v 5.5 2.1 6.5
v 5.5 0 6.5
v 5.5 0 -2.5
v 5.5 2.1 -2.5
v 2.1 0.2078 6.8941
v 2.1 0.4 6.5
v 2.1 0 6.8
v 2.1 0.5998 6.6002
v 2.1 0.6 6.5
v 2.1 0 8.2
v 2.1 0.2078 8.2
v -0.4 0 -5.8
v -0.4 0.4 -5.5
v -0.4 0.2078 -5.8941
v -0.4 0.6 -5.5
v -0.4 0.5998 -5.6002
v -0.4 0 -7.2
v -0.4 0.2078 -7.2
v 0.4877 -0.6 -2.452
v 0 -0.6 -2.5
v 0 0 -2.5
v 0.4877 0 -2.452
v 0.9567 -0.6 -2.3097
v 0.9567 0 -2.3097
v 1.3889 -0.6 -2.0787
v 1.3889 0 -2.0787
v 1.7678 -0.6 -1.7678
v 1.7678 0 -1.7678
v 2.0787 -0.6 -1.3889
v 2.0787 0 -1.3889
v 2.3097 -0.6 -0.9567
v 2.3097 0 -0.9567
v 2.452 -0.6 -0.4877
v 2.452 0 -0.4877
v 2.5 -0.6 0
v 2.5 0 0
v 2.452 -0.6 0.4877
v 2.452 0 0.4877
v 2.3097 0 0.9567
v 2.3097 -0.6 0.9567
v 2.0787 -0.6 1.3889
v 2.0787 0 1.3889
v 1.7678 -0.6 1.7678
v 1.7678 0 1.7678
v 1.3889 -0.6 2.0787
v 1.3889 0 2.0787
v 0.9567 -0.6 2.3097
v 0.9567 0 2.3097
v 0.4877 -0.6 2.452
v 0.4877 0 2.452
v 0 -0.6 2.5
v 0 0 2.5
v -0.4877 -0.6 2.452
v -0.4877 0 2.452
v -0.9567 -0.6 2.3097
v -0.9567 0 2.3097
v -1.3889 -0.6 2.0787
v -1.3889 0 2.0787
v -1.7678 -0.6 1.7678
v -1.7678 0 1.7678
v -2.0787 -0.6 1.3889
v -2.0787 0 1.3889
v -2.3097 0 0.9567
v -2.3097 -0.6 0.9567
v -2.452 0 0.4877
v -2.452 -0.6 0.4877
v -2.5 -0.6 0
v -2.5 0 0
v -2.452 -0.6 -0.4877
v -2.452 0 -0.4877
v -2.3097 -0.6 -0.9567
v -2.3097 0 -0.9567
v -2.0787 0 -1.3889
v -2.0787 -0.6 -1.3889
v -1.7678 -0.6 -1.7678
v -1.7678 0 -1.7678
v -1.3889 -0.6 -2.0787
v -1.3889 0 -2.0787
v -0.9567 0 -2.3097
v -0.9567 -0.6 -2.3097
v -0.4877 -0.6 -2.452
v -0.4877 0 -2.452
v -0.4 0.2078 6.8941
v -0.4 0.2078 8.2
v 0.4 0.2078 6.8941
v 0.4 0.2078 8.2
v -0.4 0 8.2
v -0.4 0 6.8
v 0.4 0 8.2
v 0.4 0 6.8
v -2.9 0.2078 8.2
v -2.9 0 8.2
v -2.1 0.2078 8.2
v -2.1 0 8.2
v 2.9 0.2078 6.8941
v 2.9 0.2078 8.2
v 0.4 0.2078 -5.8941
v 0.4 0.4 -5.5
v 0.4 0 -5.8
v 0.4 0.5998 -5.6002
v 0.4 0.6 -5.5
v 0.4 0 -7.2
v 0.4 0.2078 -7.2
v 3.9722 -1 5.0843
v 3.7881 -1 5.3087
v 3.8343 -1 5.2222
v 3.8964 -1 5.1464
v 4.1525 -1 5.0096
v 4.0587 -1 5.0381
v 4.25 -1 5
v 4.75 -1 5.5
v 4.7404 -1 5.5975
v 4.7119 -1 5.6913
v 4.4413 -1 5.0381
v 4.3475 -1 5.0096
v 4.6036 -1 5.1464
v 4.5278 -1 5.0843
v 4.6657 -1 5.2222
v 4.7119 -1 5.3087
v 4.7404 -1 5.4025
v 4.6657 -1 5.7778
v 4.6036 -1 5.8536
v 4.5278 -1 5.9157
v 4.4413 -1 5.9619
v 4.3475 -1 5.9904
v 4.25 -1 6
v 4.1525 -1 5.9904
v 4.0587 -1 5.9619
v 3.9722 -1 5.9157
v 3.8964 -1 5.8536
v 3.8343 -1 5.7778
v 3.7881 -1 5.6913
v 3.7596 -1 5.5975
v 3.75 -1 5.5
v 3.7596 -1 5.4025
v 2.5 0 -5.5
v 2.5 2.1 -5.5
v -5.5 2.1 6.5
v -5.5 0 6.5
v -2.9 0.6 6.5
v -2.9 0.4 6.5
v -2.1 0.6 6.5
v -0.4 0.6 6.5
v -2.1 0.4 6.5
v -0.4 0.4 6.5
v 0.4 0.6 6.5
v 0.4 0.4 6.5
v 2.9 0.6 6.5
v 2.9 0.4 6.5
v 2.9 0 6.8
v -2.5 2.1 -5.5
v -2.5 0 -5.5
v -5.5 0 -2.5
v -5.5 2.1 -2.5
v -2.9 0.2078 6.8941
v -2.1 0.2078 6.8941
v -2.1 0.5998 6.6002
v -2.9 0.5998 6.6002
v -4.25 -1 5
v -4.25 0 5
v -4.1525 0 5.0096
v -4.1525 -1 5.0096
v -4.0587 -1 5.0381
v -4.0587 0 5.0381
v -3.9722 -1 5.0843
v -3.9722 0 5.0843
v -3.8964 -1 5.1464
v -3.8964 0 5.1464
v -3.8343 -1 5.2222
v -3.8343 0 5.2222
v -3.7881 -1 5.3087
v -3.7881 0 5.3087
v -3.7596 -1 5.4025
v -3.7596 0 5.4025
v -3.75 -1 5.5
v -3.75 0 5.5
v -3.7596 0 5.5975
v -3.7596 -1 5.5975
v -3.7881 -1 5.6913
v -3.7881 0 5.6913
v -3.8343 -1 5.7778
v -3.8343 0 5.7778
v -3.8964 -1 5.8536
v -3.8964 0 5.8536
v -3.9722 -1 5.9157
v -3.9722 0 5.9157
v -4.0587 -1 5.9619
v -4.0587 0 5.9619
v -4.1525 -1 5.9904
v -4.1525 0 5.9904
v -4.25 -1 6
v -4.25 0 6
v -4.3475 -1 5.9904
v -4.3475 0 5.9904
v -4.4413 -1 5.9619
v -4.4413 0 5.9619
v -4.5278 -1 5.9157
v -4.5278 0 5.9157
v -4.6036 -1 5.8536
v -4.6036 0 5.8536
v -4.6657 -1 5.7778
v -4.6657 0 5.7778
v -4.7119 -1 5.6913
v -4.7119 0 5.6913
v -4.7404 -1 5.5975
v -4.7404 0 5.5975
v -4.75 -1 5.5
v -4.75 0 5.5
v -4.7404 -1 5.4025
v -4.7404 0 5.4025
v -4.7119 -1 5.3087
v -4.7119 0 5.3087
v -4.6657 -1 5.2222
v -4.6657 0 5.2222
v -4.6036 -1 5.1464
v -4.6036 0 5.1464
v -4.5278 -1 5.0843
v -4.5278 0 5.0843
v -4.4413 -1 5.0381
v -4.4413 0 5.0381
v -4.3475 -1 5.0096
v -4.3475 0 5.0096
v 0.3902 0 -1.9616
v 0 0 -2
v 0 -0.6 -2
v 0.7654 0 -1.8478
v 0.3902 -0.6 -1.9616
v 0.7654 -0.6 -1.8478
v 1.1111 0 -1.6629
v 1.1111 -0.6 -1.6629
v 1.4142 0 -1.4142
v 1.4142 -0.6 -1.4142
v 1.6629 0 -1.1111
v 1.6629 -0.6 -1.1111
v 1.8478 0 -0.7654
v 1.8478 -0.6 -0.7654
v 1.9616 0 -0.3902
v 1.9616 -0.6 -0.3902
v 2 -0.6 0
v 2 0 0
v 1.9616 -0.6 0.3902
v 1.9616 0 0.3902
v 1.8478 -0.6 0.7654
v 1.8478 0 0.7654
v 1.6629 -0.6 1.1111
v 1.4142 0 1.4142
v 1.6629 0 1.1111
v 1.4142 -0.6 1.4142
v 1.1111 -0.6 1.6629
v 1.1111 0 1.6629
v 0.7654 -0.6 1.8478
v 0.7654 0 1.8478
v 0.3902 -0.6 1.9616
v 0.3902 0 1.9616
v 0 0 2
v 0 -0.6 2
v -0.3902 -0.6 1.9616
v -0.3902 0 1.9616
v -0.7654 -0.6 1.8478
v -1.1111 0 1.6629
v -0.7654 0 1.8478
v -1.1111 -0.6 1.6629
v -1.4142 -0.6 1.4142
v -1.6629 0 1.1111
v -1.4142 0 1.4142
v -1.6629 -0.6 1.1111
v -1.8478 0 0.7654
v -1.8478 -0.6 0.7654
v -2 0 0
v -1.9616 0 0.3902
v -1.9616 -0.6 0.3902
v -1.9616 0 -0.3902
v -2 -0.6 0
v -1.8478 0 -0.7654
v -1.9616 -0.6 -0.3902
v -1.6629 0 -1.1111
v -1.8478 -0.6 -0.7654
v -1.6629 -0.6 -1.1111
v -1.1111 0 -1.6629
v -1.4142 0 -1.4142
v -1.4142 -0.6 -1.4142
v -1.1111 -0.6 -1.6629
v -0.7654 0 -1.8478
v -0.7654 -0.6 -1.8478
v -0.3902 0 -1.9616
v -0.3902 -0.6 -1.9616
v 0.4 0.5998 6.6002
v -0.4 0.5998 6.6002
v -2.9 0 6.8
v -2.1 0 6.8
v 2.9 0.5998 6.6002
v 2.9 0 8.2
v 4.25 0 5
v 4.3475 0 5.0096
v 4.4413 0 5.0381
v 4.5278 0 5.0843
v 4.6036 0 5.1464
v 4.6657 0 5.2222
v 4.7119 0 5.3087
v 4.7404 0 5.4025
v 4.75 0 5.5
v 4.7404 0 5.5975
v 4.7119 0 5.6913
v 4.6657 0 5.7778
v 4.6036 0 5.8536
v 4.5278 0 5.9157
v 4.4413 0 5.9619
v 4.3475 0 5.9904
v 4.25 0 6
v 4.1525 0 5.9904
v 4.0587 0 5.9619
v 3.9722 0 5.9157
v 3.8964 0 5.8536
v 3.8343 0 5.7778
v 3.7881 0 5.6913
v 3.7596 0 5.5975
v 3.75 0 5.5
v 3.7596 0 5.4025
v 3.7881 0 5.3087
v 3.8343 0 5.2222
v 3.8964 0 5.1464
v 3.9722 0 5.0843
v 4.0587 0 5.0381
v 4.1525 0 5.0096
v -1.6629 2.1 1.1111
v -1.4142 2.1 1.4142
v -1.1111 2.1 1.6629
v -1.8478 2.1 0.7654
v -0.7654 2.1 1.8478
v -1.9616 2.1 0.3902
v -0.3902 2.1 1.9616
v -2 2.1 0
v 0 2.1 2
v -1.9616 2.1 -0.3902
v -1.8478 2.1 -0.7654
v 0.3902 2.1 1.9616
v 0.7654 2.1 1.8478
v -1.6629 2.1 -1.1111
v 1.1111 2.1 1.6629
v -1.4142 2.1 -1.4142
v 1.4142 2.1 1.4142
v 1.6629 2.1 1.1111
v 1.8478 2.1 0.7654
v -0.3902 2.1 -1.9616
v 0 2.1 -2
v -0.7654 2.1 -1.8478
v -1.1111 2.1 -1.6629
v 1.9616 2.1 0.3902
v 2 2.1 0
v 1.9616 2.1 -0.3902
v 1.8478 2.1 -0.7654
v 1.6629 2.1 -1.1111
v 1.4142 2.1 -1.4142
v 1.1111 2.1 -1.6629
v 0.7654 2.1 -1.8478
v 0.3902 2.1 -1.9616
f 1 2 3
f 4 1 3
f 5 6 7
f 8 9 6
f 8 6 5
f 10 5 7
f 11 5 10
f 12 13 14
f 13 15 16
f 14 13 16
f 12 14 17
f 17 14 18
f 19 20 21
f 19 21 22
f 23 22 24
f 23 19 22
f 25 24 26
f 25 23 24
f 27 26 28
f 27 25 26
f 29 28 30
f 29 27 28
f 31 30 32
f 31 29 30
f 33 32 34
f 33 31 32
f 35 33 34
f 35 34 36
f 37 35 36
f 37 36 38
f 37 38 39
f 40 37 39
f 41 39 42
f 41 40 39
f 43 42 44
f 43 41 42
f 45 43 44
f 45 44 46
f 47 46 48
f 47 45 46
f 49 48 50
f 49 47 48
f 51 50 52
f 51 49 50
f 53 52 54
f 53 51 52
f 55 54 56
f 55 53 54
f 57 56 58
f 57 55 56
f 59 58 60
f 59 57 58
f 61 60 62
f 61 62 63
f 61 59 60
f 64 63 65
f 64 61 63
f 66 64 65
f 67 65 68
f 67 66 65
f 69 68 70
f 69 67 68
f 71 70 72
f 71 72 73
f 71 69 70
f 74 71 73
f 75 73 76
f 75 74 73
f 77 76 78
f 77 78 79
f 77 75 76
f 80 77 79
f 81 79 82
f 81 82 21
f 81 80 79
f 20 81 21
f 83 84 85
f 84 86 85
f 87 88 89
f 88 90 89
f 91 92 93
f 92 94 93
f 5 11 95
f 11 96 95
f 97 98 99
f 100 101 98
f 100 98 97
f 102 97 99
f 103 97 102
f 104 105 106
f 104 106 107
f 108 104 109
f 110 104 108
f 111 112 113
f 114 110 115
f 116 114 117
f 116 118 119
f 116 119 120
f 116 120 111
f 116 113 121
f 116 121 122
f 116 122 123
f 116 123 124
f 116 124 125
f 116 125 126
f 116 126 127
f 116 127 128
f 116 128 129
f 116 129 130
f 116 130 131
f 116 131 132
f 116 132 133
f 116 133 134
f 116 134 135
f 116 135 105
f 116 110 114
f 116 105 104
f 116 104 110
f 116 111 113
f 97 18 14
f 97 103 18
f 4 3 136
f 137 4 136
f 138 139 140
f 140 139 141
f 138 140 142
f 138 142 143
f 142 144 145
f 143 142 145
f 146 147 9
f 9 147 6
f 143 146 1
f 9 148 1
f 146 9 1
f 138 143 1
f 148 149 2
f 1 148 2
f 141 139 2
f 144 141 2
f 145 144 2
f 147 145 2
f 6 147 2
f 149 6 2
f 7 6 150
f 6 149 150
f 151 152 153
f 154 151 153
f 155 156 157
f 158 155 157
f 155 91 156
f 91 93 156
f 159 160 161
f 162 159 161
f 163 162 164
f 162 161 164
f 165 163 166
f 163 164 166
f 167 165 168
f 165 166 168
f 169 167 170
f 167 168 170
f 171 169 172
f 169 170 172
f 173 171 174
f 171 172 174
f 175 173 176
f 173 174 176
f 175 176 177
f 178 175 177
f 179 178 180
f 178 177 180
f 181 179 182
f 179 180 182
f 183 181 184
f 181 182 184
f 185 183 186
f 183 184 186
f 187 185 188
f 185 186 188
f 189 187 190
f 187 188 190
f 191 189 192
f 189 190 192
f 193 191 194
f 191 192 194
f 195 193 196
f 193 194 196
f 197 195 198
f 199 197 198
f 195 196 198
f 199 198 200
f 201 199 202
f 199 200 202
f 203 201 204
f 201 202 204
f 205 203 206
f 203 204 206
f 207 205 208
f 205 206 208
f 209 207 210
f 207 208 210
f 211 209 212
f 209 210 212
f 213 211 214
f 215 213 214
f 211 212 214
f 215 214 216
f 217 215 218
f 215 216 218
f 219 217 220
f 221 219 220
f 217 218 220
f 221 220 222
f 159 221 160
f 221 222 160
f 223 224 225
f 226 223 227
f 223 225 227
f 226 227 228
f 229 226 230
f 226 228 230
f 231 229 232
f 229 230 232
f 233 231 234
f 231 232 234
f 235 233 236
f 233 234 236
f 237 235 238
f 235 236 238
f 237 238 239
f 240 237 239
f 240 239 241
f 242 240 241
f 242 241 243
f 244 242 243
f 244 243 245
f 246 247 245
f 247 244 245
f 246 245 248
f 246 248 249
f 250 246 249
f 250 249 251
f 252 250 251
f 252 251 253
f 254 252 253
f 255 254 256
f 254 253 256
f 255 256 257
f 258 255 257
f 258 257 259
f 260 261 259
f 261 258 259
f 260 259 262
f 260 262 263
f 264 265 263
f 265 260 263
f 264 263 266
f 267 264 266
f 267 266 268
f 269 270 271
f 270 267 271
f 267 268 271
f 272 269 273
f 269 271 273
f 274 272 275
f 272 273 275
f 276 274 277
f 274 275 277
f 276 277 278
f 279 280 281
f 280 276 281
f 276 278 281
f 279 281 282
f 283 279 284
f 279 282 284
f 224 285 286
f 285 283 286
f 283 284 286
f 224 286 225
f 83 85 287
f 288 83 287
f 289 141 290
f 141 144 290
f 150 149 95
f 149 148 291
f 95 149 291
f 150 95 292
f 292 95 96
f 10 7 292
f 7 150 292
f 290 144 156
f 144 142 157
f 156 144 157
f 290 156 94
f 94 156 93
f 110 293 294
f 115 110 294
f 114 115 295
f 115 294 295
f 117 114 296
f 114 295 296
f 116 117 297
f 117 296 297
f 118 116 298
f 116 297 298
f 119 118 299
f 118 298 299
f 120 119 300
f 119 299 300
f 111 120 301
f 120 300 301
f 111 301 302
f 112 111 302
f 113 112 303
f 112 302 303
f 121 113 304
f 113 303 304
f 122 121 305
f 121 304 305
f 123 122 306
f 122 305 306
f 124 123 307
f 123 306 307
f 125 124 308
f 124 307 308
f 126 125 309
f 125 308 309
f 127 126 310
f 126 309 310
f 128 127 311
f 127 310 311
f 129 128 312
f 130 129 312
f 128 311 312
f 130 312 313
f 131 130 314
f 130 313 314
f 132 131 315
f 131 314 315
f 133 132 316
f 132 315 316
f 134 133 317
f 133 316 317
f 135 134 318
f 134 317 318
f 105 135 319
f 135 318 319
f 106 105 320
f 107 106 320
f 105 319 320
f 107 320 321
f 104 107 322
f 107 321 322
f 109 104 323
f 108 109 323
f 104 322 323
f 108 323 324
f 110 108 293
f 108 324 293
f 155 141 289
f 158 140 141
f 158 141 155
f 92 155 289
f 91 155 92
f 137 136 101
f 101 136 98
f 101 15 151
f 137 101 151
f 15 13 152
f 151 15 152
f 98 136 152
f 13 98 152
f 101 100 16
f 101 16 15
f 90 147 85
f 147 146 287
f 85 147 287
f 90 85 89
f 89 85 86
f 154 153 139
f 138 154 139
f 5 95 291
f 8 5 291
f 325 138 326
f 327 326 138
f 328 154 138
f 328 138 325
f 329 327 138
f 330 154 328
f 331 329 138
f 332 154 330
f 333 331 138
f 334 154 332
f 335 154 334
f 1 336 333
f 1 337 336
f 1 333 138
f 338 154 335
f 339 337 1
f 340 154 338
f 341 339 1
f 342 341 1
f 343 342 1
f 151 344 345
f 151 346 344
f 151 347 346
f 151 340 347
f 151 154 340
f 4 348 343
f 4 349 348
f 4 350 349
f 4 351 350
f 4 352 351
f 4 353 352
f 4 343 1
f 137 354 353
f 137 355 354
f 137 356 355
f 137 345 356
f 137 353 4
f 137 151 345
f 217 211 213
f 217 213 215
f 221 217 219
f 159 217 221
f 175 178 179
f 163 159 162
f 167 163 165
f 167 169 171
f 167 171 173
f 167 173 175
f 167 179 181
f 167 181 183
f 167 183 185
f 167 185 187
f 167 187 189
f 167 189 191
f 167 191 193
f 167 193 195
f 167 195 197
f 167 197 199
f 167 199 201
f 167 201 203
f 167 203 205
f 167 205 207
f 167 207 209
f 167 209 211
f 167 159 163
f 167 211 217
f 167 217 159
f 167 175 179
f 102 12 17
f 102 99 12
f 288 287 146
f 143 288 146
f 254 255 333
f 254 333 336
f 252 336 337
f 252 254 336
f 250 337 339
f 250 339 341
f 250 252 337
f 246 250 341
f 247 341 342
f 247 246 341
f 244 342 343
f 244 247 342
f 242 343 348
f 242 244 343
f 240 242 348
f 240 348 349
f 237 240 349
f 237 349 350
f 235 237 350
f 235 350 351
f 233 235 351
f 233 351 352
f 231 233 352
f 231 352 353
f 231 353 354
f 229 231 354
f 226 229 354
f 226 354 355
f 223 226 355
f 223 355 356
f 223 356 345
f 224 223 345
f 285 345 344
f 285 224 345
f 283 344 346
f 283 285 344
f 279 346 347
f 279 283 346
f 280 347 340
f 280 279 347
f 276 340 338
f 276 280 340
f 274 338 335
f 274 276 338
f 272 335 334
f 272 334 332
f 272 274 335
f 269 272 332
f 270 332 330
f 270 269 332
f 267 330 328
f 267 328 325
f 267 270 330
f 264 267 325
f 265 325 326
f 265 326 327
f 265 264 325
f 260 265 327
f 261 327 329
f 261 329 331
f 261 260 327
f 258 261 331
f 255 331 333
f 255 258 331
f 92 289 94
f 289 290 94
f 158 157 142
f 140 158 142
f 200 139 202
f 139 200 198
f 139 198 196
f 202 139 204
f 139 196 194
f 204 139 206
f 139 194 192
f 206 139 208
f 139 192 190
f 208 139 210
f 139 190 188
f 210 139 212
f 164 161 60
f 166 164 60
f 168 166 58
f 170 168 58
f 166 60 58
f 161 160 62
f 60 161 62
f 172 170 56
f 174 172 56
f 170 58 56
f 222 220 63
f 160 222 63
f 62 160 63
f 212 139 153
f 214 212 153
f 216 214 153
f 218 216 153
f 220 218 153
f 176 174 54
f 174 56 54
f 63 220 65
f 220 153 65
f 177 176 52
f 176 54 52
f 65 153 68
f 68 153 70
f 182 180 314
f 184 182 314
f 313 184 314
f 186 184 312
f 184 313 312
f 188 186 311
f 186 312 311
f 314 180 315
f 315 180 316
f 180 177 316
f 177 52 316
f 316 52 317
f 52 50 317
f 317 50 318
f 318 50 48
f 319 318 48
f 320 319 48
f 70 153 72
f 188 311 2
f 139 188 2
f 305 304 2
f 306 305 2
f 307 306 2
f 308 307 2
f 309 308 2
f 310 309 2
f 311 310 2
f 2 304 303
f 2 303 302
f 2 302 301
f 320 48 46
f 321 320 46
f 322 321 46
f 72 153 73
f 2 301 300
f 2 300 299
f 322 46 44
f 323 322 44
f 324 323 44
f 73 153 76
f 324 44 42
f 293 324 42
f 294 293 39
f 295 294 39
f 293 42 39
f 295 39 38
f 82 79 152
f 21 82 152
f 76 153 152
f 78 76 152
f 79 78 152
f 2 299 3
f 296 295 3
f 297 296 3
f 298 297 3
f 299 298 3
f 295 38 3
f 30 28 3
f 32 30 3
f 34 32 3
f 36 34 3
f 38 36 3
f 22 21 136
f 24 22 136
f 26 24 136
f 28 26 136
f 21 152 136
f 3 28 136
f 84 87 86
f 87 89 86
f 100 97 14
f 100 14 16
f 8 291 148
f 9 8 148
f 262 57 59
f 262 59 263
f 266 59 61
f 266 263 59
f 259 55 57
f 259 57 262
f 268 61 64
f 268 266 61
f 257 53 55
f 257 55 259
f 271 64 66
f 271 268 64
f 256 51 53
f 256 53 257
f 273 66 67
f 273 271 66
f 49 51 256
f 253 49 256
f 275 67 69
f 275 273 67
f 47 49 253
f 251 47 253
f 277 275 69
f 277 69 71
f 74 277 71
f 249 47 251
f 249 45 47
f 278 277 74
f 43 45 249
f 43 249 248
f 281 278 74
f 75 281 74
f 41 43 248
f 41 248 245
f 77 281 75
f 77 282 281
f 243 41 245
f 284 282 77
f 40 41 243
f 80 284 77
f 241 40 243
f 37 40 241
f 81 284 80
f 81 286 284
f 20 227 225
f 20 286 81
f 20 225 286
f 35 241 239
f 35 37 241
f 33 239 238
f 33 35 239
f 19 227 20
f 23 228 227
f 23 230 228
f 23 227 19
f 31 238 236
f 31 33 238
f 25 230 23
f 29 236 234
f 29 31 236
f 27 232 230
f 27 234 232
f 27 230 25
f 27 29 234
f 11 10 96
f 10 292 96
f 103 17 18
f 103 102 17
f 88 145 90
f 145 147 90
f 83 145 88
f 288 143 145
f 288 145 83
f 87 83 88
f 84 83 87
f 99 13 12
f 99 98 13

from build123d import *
from build123d.topology import SkipClean

# Parameters (mm, degrees)
SKETCH1_R           = 2
BOSS_EXTRUDE1_DEPTH = 2.1
BOSS_EXTRUDE2_START = 0.6
SKETCH2_R           = 2.5
SKETCH2_R_2         = 2
BOSS_EXTRUDE2_DEPTH = 0.6
SKETCH3_R           = 0.5
BOSS_EXTRUDE3_DEPTH = 1
BOSS_EXTRUDE4_DEPTH = 0.4
LPATTERN1_COUNT     = 2
LPATTERN1_PITCH     = 2.5
LPATTERN1_COL_COUNT = 2
LPATTERN1_COL_PITCH = 2.5


with BuildPart() as part:
    # Sketch1 → Boss-Extrude1 (new body)
    with BuildSketch(Plane(origin=(0, 0, 0), x_dir=(1, 0, 0), z_dir=(0, 1, 0))):
        Polygon((-5.5, -6.5), (5.5, -6.5), (5.5, 2.5), (2.5, 5.5), (-2.5, 5.5), (-5.5, 2.5), align=None)
        with Locations(Location((0, 0, 0), (0, 0, 270))):
            Circle(SKETCH1_R, mode=Mode.SUBTRACT)
    extrude(amount=BOSS_EXTRUDE1_DEPTH)

    # Sketch2 → Boss-Extrude2 (add)
    with SkipClean():  # the faces are left unmerged after this step: merging them gives an invalid solid
        with BuildSketch(Plane.XZ.offset(BOSS_EXTRUDE2_START)):
            with Locations(Location((0, 0, 0), (0, 0, 270))):
                Circle(SKETCH2_R)
            with Locations(Location((0, 0, 0), (0, 0, 270))):
                Circle(SKETCH2_R_2, mode=Mode.SUBTRACT)
        extrude(amount=-BOSS_EXTRUDE2_DEPTH)

    # Sketch3 → Boss-Extrude3 (add)
    with SkipClean():  # the faces are left unmerged after this step: merging them gives an invalid solid
        with BuildSketch(Plane.XZ):
            with Locations(Location((4.250000001, 5.5, 0), (0, 0, 270))):
                Circle(SKETCH3_R)
            with Locations(Location((-4.249999999, 5.5, 0), (0, 0, 270))):
                Circle(SKETCH3_R)
        extrude(amount=BOSS_EXTRUDE3_DEPTH)

    # Sketch4 → Boss-Extrude4 (add, symmetric)
    with SkipClean():  # the faces are left unmerged after this step: merging them gives an invalid solid
        with BuildSketch(Plane(origin=(0, 0, 0), x_dir=(0, 0, -1), z_dir=(1, 0, 0))):
            Polygon((-6.5, 0.6), (-6.5, 0.4), (-6.8, 0), (-8.2, 0), (-8.2, 0.207806039), (-6.894145471, 0.207806039), (-6.600159334, 0.599787555), align=None)
        boss_extrude4 = extrude(amount=BOSS_EXTRUDE4_DEPTH, both=True)

    # LPattern1: Boss-Extrude4 ×2
    with SkipClean():  # the faces are left unmerged after this step: merging them gives an invalid solid
        with Locations(*[(i * LPATTERN1_PITCH, 0, 0) for i in range(1, LPATTERN1_COUNT)]):
            add(boss_extrude4)

    # LPattern1 col: Boss-Extrude4 ×2
    with SkipClean():  # the faces are left unmerged after this step: merging them gives an invalid solid
        with Locations(*[(-i * LPATTERN1_COL_PITCH, 0, 0) for i in range(1, LPATTERN1_COL_COUNT)]):
            add(boss_extrude4)

    # Mirror1: Boss-Extrude4 across plane
    with SkipClean():  # the faces are left unmerged after this step: merging them gives an invalid solid
        add(boss_extrude4.mirror(Plane.XY.offset(0.5)))


solid = part.part
